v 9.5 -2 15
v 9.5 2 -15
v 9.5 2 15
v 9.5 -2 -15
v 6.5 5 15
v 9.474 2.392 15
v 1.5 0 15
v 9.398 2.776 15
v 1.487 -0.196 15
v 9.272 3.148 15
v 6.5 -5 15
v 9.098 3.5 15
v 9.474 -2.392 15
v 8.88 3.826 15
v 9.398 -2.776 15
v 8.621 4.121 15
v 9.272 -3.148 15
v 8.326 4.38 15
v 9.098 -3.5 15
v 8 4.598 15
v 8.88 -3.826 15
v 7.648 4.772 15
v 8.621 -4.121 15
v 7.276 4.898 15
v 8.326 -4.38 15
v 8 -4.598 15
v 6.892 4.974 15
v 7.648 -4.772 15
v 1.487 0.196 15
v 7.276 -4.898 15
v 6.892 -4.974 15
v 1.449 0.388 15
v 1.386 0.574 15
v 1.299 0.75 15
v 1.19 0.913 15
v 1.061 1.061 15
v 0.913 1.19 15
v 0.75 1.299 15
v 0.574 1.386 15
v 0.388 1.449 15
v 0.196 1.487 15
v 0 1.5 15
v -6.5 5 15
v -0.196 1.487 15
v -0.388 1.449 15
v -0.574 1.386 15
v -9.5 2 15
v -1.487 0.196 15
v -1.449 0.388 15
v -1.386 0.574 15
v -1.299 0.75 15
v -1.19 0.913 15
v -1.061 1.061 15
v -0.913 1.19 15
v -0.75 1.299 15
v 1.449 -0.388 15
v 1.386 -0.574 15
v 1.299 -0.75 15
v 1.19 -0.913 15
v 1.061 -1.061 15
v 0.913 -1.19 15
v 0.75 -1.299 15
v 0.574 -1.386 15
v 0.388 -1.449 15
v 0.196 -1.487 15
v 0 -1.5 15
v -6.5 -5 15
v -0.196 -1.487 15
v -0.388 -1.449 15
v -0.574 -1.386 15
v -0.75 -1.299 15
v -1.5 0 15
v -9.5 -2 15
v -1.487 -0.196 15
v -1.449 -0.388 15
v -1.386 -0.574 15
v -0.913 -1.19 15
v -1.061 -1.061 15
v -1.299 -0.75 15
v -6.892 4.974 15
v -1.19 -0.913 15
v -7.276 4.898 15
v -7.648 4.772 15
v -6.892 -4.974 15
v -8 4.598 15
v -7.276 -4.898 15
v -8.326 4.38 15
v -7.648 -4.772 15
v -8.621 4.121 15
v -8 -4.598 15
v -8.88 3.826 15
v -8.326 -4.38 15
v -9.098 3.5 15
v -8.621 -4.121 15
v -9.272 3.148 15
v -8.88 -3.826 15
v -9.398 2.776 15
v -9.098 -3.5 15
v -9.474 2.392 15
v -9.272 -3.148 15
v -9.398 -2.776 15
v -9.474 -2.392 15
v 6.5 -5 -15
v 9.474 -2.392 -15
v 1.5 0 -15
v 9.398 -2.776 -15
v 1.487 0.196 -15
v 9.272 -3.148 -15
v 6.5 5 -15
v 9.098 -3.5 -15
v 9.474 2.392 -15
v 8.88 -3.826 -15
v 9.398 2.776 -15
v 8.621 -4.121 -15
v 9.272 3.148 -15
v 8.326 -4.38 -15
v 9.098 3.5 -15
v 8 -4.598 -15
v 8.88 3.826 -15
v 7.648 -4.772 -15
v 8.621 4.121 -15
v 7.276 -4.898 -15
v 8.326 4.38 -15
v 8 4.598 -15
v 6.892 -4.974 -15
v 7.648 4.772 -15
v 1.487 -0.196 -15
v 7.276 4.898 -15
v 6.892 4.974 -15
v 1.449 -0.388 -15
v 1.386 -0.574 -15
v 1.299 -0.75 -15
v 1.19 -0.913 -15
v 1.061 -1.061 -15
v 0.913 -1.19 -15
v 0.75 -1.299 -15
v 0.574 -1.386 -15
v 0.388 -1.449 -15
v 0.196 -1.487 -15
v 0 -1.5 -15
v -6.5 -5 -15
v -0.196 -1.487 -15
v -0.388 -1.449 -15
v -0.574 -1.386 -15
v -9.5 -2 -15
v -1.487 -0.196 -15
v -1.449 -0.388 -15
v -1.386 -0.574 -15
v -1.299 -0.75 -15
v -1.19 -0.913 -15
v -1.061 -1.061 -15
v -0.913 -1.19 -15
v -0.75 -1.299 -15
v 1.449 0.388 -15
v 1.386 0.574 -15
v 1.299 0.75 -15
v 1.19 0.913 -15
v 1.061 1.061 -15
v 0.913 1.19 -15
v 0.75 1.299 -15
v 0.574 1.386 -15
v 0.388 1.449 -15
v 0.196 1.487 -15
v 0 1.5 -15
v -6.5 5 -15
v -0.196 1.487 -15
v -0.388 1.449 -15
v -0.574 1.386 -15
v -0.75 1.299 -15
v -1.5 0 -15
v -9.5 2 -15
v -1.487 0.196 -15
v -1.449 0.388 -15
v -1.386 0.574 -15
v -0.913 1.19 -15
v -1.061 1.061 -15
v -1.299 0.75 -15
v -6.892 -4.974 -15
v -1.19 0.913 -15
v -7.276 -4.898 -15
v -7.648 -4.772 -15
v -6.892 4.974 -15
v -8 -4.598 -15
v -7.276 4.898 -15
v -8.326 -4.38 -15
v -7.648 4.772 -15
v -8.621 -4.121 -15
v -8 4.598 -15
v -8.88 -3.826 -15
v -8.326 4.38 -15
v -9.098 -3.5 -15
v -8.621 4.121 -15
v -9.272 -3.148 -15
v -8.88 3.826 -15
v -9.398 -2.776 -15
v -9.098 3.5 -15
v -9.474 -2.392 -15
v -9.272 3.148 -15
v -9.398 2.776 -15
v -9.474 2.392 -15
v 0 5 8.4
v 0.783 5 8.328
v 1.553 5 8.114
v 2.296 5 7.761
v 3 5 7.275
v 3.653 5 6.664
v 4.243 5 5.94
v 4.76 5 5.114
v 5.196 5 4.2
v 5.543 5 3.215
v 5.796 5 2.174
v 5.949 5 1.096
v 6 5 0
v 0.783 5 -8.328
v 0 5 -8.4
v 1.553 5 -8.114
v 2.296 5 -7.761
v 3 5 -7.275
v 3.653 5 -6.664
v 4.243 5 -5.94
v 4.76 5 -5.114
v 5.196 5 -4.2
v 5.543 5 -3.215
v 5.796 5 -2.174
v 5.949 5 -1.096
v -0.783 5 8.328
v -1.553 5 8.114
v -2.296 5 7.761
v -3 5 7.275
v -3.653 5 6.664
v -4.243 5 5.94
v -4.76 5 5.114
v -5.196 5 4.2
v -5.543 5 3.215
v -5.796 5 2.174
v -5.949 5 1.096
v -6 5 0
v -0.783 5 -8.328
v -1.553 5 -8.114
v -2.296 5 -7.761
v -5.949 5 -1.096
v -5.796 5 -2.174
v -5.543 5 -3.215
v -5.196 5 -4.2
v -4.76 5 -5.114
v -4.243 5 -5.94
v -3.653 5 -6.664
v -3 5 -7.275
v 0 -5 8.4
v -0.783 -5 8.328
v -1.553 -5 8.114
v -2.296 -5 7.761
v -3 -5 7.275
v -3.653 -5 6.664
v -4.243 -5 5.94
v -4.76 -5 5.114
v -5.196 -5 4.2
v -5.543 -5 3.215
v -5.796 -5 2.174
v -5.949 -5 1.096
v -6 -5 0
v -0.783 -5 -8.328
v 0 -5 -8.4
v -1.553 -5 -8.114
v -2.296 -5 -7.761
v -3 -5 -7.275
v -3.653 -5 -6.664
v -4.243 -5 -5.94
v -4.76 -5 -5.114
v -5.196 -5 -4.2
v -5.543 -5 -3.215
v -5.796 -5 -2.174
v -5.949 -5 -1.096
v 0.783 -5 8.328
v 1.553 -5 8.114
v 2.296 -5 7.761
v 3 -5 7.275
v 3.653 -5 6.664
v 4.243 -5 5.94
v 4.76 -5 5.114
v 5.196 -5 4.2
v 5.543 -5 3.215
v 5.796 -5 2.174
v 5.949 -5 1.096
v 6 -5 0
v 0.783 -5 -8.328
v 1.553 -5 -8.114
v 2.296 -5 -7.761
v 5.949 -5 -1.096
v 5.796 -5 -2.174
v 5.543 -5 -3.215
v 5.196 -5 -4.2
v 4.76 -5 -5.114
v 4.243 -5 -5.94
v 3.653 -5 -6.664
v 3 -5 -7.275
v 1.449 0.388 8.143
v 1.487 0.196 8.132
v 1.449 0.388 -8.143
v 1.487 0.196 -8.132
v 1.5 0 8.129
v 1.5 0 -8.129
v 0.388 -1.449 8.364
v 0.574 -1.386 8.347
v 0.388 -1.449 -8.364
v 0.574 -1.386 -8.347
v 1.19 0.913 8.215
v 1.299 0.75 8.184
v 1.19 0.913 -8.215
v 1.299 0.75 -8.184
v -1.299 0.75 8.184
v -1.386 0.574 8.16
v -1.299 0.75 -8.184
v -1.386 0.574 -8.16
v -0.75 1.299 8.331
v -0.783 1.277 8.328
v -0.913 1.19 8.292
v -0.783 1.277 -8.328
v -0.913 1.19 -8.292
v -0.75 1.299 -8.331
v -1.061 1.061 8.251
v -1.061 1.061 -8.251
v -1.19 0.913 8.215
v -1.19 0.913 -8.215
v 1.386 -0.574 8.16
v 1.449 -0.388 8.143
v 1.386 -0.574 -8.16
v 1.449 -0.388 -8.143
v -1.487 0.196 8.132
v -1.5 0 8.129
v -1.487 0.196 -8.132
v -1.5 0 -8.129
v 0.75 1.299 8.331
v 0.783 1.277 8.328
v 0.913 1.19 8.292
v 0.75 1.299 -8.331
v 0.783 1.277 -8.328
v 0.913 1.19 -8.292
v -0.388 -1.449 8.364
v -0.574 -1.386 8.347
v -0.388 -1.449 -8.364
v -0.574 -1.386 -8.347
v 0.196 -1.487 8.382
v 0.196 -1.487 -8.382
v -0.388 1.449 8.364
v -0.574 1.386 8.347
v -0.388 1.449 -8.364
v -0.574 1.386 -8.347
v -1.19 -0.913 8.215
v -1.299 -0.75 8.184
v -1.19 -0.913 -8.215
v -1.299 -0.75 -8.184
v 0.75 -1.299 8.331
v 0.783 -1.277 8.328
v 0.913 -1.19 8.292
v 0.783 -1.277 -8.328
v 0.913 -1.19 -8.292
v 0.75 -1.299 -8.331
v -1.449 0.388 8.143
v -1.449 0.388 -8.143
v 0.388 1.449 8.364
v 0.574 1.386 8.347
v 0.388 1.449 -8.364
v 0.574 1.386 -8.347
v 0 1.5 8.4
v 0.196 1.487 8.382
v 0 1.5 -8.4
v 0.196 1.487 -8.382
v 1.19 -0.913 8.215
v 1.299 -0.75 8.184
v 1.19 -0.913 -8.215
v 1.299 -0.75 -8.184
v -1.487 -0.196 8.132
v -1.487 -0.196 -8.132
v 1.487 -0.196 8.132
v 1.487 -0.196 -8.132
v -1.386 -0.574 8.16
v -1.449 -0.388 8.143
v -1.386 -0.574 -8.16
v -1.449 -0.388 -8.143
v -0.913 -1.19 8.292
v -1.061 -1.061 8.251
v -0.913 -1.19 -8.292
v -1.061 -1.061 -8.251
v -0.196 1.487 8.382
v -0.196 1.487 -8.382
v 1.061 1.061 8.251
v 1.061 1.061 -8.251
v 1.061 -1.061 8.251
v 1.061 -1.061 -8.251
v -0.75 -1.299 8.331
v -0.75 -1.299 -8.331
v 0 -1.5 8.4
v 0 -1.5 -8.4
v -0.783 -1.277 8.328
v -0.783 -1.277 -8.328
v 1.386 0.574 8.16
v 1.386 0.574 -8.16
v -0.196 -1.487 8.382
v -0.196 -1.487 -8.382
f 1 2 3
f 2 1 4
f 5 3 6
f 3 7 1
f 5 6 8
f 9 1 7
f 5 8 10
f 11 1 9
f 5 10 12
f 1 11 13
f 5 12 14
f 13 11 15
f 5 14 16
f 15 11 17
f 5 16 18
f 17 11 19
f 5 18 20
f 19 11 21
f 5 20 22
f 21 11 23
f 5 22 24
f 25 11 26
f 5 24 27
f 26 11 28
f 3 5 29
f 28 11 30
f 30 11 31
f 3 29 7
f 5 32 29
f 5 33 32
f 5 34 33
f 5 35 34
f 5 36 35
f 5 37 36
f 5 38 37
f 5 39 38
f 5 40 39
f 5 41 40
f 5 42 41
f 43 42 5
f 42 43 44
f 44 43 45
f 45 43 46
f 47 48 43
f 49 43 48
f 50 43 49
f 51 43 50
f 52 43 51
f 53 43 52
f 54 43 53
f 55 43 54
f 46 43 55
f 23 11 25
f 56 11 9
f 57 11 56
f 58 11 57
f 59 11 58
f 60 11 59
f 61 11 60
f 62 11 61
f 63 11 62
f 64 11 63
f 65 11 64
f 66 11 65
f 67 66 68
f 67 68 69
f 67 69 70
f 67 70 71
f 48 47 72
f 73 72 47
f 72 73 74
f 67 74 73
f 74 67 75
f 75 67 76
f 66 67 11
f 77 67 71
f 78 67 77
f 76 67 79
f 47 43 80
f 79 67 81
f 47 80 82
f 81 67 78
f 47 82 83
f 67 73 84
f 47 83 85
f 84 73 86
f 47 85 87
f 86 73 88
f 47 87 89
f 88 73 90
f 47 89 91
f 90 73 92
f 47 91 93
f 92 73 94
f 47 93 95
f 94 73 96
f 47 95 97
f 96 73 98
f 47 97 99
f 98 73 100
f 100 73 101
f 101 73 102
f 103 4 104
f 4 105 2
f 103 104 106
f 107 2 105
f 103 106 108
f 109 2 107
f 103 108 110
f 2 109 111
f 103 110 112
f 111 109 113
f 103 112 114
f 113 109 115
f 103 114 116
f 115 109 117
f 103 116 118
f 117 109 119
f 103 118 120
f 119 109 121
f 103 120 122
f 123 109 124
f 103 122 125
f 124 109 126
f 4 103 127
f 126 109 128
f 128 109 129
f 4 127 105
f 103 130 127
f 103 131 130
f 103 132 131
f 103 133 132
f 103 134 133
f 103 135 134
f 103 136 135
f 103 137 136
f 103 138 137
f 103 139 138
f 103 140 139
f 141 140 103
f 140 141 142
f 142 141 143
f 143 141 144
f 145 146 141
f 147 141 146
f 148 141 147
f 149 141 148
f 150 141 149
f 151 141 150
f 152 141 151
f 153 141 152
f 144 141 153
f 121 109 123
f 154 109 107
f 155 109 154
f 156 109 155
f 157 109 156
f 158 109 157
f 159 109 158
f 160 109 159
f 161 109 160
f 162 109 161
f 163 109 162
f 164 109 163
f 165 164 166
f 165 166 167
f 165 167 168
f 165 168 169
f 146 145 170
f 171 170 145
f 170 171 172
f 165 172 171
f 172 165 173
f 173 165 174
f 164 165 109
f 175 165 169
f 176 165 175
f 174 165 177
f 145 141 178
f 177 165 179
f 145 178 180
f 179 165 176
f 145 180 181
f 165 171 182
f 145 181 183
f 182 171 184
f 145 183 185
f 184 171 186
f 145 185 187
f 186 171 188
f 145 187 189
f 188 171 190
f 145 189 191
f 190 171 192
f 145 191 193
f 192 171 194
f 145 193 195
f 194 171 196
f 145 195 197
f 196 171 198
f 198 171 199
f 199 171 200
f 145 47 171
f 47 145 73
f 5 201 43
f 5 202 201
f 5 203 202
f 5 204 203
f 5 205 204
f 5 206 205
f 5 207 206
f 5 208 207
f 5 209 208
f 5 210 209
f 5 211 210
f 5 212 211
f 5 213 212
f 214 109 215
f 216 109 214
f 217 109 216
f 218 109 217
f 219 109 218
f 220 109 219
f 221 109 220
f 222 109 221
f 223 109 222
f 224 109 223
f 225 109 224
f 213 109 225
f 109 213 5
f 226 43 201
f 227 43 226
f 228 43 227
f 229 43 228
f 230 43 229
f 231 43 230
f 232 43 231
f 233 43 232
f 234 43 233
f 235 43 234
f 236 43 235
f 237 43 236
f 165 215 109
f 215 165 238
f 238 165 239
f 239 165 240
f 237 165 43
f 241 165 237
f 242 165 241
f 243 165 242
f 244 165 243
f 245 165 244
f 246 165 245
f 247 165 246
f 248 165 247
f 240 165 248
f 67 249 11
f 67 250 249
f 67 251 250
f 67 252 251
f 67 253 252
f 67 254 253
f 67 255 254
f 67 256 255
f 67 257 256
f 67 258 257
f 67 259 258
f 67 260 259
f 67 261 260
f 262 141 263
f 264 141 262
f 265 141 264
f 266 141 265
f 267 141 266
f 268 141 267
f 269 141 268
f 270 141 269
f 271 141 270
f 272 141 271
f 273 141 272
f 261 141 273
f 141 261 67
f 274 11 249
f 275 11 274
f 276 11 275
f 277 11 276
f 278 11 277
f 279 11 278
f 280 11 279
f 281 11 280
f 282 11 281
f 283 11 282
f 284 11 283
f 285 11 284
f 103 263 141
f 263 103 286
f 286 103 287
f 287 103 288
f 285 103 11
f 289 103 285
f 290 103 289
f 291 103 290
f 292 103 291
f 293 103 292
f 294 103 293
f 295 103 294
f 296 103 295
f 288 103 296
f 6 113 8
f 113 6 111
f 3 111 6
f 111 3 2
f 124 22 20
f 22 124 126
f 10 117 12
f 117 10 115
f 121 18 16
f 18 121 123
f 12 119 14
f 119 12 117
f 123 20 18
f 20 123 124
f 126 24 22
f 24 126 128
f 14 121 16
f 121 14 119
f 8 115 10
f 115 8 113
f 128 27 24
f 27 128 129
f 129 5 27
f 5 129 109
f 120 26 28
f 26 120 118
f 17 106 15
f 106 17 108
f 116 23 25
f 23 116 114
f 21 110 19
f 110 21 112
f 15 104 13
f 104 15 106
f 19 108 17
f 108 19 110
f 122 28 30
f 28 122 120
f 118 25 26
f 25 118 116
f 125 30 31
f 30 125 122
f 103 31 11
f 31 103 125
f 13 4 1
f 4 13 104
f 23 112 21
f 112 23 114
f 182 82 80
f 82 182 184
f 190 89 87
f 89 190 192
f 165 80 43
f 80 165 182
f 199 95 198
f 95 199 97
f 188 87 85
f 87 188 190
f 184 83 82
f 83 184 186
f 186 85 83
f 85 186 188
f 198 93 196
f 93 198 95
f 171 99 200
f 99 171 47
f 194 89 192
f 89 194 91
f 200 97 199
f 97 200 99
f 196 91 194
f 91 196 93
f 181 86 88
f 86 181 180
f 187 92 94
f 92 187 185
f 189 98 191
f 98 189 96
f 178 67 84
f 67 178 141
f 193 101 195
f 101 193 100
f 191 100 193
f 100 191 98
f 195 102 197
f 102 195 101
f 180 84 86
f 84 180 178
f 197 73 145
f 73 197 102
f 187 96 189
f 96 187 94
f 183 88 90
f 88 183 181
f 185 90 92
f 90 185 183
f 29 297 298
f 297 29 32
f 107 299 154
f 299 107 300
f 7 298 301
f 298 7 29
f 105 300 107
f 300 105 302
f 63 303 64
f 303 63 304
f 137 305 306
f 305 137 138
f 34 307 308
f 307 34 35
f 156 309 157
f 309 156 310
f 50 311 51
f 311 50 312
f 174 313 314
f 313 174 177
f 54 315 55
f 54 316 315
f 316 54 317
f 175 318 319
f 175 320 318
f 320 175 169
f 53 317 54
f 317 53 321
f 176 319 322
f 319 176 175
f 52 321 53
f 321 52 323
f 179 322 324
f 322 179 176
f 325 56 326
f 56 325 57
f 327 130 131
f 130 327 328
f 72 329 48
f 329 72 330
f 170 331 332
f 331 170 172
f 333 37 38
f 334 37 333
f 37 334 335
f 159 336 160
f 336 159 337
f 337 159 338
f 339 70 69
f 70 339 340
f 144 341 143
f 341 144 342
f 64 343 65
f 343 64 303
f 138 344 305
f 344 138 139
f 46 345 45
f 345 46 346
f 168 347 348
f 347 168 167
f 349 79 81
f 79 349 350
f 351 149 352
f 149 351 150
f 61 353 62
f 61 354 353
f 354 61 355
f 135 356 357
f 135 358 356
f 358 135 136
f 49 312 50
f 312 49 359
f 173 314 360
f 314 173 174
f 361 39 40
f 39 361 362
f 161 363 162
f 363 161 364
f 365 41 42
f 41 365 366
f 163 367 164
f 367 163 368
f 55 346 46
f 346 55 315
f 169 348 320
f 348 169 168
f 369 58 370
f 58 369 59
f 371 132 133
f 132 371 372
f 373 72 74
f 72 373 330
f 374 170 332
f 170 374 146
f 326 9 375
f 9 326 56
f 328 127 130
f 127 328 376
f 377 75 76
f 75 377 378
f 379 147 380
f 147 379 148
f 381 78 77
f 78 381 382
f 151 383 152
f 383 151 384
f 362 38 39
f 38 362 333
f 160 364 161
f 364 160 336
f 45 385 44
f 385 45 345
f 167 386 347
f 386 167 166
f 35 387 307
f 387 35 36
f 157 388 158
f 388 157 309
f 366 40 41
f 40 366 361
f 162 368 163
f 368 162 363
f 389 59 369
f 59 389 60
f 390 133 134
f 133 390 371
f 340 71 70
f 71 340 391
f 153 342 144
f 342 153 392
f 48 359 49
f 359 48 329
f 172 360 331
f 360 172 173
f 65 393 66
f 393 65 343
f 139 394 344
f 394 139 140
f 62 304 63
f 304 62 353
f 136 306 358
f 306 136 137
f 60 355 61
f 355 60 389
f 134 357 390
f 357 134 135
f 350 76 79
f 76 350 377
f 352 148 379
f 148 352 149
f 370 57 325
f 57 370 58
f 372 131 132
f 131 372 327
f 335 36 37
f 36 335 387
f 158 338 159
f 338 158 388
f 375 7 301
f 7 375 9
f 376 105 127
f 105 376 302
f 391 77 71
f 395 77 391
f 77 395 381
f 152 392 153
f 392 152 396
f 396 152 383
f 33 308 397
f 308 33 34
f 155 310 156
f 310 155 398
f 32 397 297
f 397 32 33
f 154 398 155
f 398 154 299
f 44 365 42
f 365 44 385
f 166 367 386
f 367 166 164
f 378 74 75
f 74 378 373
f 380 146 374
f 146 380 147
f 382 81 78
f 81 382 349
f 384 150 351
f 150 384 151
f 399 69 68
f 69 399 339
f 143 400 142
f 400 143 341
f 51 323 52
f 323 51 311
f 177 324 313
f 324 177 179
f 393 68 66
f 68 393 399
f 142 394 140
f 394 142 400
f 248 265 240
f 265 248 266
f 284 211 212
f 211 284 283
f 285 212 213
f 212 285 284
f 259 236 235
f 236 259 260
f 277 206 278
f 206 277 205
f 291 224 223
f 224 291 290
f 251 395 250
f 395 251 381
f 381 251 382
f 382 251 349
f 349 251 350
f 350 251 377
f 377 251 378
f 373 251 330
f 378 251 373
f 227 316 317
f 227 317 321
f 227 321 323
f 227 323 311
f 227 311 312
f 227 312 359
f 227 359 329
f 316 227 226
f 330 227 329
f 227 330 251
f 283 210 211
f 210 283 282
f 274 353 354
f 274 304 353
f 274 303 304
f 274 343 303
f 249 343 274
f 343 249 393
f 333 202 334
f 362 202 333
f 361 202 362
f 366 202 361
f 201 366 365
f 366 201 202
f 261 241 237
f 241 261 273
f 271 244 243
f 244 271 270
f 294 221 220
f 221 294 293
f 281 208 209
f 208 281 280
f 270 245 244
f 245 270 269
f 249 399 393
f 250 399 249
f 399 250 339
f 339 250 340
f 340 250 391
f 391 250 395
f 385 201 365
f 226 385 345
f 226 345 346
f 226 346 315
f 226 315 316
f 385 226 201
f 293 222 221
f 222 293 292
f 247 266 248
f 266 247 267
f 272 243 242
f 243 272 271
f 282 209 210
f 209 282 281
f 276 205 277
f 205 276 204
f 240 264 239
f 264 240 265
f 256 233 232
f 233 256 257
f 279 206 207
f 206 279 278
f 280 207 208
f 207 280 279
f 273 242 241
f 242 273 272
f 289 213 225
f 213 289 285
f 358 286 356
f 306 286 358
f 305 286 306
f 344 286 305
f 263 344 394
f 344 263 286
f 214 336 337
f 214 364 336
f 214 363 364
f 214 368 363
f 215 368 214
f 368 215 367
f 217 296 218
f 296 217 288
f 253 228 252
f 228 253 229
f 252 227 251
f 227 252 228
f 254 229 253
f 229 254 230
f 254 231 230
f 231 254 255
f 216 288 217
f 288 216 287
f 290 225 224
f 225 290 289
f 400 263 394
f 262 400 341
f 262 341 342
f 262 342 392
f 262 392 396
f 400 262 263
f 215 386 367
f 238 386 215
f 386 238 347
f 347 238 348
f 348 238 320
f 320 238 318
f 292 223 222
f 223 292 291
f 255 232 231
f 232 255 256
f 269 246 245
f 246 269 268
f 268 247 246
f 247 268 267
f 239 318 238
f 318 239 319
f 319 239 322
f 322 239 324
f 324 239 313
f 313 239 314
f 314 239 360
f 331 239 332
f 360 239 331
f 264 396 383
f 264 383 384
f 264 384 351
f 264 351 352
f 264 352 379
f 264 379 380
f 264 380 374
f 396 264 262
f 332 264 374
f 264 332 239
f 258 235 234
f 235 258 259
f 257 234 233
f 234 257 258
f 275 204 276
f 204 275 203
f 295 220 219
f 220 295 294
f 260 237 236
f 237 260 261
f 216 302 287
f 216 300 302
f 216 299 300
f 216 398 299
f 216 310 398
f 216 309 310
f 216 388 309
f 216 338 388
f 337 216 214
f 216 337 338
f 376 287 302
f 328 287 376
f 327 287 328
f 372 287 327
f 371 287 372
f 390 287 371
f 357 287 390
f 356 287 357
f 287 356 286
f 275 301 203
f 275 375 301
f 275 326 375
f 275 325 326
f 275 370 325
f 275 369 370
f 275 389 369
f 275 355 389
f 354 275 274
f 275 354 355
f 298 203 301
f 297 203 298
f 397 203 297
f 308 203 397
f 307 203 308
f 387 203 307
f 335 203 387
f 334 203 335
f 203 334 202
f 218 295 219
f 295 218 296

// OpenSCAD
// file: misc_parts.scad
/*
Info: 
This lib contains things like screws, nuts and bearings.

Improvement:
- wasn't there before

TODO: 
- differentiate between parts that get substracted and normal parts (different diameters)

*/

include <misc_parts_inc.scad>

module screw_M3(length) 
{
    cylinder(d=M3_screw_hole_dia, h=length);
	cylinder(d=M3_nut_hole_dia, h=2.3, center=true, $fn=6);
}
screw_M3(10);

module screw_M4(length) 
{
    cylinder(d=M4_screw_hole_dia, h=length);
	cylinder(d=M4_nut_hole_dia, h=3.3, center=true, $fn=6);
}
translate([0,10,0]) screw_M4(10);


// Bearing - inner Diameter, outer diameter, width
module bearing(ID,OD,W) 
{
    translate([0,0,W/2]) difference() 
    {
        cylinder(d=OD, h=W, center=true);
        cylinder(d=ID, h=W+1, center=true);
    }
}
translate([0,30,0]) bearing(5,16,5);


// unregular cube
// 4 of the 12 edges are rounded
module round_cuboid(x,y,z,r,$fn=48) 
{
    cube([x,y-2*r,z],center=true);
    cube([x-2*r,y,z],center=true);
    cube([x-2*r,y-2*r,z],center=true);
    
    translate([+x/2-r,+y/2-r,0]) cylinder(r=r,h=z,center=true);
    translate([+x/2-r,-y/2+r,0]) cylinder(r=r,h=z,center=true);
    translate([-x/2+r,+y/2-r,0]) cylinder(r=r,h=z,center=true);
    translate([-x/2+r,-y/2+r,0]) cylinder(r=r,h=z,center=true);
}   
translate([0,50,0]) round_cuboid(x=19,y=10,z=30,r=3);

// unregular cube
// all 12 edges are rounded
module round_cuboid3(x,y,z,r,$fn=48) 
{
    cube([x,y-2*r,z-2*r],center=true);
    cube([x-2*r,y,z-2*r],center=true);
    cube([x-2*r,y-2*r,z],center=true);
    
    translate([+x/2-r,+y/2-r,0]) cylinder(r=r,h=z-2*r,center=true);
    translate([+x/2-r,-y/2+r,0]) cylinder(r=r,h=z-2*r,center=true);
    translate([-x/2+r,+y/2-r,0]) cylinder(r=r,h=z-2*r,center=true);
    translate([-x/2+r,-y/2+r,0]) cylinder(r=r,h=z-2*r,center=true);

    translate([+x/2-r,0,+z/2-r]) rotate([90,0,0]) cylinder(r=r,h=y-2*r,center=true);
    translate([+x/2-r,0,-z/2+r]) rotate([90,0,0]) cylinder(r=r,h=y-2*r,center=true);
    translate([-x/2+r,0,+z/2-r]) rotate([90,0,0]) cylinder(r=r,h=y-2*r,center=true);
    translate([-x/2+r,0,-z/2+r]) rotate([90,0,0]) cylinder(r=r,h=y-2*r,center=true);
    
    translate([0,+y/2-r,+z/2-r]) rotate([0,90,0]) cylinder(r=r,h=x-2*r,center=true);
    translate([0,+y/2-r,-z/2+r]) rotate([0,90,0]) cylinder(r=r,h=x-2*r,center=true);
    translate([0,-y/2+r,+z/2-r]) rotate([0,90,0]) cylinder(r=r,h=x-2*r,center=true);
    translate([0,-y/2+r,-z/2+r]) rotate([0,90,0]) cylinder(r=r,h=x-2*r,center=true);
    
    translate([+(x/2-r),+(y/2-r),+(z/2-r)]) sphere(r=r);
    translate([+(x/2-r),+(y/2-r),-(z/2-r)]) sphere(r=r);
    translate([+(x/2-r),-(y/2-r),+(z/2-r)]) sphere(r=r);
    translate([+(x/2-r),-(y/2-r),-(z/2-r)]) sphere(r=r);
    translate([-(x/2-r),+(y/2-r),+(z/2-r)]) sphere(r=r);
    translate([-(x/2-r),+(y/2-r),-(z/2-r)]) sphere(r=r);
    translate([-(x/2-r),-(y/2-r),+(z/2-r)]) sphere(r=r);
    translate([-(x/2-r),-(y/2-r),-(z/2-r)]) sphere(r=r);
}

translate([0,70,0]) round_cuboid3(20,10,15,2);
// file: misc_parts_inc.scad
M3_screw_hole_dia = 3.4;
M3_nut_hole_dia   = 6.2+0.2;

M4_screw_hole_dia = 4.4;
M4_nut_hole_dia   = 7.7+0.2;
// main file
/*
Two of these spacers are placed between platform and hotend-mount.

Improvement: 
- offers an offset for the hotend-mount
- the fan of the E3D-Hotend fits between mount and platform 

TODO:
-
*/

$fn=48;
include <misc_parts_inc.scad>
use <misc_parts.scad>

module mount_spacer()
{
    difference() 
    {
        round_cuboid(x=19,y=10,z=30,r=3);
        cylinder(d=3,h=33,center=true);
        scale([1,1,1.4]) rotate([90,0,0]) cylinder(d=12,h=20,center=true);
    }
}

mount_spacer();
